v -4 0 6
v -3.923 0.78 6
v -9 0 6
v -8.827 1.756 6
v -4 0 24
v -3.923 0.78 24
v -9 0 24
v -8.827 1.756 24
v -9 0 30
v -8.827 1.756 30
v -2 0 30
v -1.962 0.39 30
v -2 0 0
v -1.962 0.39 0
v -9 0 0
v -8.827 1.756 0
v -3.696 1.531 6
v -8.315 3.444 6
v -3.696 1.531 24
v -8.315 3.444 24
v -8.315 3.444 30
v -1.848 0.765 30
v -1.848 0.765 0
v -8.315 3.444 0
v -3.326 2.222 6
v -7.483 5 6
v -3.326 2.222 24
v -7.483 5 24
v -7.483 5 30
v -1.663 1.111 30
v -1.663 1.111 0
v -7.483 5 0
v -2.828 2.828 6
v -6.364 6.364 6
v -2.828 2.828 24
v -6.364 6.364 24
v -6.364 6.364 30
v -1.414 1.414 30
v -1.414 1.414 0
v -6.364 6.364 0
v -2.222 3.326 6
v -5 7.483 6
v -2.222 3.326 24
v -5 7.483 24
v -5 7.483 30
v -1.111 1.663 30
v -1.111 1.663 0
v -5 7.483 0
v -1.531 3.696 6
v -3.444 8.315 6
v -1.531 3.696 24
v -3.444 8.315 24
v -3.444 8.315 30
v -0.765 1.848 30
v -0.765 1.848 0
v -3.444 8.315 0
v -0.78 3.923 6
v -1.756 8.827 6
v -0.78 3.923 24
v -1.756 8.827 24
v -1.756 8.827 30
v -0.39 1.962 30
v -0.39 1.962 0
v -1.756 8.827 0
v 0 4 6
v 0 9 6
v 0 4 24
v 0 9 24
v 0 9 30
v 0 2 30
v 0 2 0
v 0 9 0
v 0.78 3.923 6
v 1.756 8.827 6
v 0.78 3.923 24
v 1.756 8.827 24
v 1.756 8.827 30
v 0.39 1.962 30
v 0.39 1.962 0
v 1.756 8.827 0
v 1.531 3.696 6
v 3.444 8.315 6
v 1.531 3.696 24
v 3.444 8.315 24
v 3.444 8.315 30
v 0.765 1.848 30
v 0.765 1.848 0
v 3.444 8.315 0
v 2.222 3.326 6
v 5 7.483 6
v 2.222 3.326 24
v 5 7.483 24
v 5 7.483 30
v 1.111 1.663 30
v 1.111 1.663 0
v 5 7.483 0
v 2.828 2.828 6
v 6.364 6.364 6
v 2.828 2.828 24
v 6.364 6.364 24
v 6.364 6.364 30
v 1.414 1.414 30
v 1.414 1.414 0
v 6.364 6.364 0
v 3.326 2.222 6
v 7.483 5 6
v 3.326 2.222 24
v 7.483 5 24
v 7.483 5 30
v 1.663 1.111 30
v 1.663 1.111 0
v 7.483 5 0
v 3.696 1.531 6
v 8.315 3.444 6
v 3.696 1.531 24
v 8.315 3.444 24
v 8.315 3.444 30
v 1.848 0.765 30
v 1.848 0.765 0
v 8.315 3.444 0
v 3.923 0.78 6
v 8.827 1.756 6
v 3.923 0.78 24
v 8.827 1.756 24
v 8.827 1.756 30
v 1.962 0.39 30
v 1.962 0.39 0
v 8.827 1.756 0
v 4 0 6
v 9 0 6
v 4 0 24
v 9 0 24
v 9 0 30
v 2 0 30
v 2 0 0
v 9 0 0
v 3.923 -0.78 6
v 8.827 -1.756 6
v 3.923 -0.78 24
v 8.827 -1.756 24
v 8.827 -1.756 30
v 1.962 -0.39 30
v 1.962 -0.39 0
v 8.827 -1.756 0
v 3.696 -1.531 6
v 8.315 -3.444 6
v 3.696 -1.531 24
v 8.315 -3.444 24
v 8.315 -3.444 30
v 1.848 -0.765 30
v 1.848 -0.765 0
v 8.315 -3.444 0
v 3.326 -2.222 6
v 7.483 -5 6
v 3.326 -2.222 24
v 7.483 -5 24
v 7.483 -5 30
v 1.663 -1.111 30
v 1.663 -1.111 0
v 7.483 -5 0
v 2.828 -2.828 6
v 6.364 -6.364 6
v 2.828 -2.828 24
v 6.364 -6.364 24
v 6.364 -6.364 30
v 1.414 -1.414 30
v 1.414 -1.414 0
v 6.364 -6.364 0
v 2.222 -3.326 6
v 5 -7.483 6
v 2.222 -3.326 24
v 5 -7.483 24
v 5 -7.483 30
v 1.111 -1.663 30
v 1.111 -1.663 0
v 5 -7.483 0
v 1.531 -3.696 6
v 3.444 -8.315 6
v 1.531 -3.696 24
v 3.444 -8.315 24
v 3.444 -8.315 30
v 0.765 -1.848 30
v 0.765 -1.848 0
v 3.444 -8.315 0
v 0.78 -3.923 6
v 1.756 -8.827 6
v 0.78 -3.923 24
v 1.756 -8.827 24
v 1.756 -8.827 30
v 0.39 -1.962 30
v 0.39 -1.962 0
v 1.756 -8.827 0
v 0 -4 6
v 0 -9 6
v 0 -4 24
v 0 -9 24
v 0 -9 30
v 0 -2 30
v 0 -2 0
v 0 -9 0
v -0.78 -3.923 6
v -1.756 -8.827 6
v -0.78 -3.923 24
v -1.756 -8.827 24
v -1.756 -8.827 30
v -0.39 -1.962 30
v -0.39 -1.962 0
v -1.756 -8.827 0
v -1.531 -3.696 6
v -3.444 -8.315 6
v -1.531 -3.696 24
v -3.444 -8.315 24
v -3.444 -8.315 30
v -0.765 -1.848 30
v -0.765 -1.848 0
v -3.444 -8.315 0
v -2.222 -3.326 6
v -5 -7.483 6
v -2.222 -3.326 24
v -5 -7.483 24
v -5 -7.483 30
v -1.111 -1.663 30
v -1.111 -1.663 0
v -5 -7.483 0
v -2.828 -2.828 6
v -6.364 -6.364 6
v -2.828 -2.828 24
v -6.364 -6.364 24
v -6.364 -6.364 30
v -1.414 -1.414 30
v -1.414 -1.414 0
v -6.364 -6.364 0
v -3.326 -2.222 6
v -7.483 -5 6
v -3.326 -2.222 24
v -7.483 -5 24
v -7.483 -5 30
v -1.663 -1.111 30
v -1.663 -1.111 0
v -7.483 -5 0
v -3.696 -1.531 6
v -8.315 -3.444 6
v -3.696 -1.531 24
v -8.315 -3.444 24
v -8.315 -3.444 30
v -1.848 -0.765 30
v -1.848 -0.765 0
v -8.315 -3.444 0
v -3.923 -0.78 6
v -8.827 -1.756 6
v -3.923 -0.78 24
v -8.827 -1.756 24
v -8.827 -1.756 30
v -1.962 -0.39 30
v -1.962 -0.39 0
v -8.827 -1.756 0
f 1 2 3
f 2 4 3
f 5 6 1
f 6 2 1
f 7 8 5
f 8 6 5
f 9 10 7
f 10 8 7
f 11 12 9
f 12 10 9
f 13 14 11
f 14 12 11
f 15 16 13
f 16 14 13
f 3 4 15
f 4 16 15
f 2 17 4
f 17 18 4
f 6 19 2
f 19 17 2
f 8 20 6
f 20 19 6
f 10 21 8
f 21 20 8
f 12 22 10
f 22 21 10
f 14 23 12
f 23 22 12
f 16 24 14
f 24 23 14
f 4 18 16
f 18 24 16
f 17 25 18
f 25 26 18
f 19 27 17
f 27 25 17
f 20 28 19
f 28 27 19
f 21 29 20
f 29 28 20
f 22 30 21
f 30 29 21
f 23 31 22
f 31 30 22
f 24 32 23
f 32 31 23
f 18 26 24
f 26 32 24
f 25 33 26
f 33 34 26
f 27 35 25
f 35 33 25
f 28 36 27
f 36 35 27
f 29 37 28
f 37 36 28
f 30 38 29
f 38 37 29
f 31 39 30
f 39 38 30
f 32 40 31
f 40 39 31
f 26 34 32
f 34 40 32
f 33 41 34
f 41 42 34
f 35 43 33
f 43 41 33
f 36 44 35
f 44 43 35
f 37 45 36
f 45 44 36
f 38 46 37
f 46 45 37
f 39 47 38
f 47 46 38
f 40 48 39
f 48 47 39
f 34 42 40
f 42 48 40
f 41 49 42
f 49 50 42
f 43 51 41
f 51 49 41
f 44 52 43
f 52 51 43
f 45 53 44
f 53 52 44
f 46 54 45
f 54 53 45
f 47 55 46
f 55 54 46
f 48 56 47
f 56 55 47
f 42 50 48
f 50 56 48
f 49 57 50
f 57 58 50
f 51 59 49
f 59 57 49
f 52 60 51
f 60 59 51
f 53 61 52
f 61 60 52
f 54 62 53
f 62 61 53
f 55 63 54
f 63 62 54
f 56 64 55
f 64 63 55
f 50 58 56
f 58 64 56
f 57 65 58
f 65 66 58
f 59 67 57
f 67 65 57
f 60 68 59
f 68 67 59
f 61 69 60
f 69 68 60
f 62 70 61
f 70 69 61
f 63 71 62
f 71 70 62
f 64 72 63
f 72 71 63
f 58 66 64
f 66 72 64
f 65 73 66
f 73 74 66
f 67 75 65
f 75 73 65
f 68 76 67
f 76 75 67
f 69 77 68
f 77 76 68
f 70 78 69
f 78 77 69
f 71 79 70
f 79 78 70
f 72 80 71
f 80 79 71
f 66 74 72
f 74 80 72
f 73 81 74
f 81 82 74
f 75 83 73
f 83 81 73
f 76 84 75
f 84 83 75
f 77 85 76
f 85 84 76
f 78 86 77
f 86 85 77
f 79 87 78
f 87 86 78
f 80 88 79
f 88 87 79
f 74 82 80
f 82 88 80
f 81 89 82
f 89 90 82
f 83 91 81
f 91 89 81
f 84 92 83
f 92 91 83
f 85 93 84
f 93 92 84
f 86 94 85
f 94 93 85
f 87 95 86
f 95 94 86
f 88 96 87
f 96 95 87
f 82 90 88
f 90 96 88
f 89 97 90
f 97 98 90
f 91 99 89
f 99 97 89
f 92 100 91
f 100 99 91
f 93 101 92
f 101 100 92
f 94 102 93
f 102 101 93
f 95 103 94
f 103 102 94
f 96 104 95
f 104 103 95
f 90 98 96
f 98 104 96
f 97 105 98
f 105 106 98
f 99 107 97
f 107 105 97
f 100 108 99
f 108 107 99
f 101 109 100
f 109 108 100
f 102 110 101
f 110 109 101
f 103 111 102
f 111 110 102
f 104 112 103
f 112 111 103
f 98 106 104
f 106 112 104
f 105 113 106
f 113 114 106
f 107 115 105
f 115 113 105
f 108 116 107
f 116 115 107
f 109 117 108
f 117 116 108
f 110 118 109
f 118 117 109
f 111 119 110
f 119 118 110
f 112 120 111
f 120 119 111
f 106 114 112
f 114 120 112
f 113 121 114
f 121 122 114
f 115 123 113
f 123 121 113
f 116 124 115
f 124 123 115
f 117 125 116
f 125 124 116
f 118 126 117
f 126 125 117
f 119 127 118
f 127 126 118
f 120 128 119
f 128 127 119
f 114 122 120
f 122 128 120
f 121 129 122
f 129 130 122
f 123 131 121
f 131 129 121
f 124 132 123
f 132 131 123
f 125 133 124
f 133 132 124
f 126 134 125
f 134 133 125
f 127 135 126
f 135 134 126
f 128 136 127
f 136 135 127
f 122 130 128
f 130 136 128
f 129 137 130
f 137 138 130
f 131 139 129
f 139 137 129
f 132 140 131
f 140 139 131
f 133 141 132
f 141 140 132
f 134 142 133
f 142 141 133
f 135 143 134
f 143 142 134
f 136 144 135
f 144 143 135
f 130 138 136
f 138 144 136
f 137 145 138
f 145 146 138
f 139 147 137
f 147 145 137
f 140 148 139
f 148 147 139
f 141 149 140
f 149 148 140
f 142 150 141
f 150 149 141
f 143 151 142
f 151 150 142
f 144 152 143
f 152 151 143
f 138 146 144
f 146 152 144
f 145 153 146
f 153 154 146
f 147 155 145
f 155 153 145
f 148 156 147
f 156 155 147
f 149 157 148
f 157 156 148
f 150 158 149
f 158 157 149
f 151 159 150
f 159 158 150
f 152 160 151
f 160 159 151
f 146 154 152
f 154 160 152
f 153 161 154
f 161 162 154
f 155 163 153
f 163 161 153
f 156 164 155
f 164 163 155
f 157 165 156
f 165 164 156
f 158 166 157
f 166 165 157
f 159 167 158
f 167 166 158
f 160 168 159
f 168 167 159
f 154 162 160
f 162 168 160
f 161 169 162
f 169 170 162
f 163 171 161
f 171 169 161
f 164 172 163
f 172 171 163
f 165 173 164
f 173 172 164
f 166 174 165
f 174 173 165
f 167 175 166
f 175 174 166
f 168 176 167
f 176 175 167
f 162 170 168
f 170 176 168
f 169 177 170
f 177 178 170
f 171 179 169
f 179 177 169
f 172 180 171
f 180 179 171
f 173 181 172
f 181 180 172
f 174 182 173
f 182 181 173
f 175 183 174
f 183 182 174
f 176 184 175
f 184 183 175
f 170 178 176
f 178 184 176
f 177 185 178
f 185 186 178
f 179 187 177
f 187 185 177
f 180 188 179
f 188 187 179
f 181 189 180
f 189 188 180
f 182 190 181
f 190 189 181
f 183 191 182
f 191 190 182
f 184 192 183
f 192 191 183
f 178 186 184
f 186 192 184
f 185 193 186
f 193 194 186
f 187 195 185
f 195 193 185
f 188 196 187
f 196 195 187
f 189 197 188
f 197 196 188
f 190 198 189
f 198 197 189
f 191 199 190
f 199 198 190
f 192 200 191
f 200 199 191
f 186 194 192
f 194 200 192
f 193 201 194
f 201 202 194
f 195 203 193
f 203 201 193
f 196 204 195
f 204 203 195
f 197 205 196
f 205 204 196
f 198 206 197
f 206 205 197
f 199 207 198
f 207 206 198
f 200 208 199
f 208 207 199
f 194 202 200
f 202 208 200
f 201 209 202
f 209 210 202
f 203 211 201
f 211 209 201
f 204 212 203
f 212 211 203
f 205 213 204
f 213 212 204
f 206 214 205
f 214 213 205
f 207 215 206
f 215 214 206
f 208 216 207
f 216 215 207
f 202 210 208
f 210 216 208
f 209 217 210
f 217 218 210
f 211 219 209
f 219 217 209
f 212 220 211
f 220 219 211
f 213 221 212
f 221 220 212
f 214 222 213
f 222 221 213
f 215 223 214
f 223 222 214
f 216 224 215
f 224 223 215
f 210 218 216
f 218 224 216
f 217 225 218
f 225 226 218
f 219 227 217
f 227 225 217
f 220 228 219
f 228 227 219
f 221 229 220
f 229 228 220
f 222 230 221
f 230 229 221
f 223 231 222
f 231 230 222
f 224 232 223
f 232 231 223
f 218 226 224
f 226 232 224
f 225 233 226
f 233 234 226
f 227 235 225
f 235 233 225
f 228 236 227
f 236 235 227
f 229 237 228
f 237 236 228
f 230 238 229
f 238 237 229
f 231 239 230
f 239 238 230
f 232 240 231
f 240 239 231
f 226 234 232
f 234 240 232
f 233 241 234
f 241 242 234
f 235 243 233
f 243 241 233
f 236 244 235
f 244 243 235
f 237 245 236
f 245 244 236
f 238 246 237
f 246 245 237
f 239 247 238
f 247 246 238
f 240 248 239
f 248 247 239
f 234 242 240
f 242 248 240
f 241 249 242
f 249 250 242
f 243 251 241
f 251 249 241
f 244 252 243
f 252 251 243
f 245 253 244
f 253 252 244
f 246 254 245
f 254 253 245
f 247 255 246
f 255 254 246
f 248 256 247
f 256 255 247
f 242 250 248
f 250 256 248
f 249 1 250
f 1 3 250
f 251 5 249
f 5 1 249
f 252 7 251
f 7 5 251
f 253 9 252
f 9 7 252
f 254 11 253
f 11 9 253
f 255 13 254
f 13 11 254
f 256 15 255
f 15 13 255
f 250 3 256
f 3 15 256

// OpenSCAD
$fn = 32;

// ----------------------------------------------------------------------
// Profiled standoff: spool spacer, 30 mm long, bore 4 mm
// ----------------------------------------------------------------------

// --- parameters (mm) ---
revolve_angle = 360;      // full turn around the Z axis
profile_points = 8;       // points of the closed outline

profile = [[2, 0], [9, 0], [9, 6], [4, 6], [4, 24], [9, 24], [9, 30], [2, 30]];  // single closed polygon, 8 points, counter clockwise

// --- the one profile operation ---
rotate_extrude(angle = revolve_angle) polygon(points = profile);
